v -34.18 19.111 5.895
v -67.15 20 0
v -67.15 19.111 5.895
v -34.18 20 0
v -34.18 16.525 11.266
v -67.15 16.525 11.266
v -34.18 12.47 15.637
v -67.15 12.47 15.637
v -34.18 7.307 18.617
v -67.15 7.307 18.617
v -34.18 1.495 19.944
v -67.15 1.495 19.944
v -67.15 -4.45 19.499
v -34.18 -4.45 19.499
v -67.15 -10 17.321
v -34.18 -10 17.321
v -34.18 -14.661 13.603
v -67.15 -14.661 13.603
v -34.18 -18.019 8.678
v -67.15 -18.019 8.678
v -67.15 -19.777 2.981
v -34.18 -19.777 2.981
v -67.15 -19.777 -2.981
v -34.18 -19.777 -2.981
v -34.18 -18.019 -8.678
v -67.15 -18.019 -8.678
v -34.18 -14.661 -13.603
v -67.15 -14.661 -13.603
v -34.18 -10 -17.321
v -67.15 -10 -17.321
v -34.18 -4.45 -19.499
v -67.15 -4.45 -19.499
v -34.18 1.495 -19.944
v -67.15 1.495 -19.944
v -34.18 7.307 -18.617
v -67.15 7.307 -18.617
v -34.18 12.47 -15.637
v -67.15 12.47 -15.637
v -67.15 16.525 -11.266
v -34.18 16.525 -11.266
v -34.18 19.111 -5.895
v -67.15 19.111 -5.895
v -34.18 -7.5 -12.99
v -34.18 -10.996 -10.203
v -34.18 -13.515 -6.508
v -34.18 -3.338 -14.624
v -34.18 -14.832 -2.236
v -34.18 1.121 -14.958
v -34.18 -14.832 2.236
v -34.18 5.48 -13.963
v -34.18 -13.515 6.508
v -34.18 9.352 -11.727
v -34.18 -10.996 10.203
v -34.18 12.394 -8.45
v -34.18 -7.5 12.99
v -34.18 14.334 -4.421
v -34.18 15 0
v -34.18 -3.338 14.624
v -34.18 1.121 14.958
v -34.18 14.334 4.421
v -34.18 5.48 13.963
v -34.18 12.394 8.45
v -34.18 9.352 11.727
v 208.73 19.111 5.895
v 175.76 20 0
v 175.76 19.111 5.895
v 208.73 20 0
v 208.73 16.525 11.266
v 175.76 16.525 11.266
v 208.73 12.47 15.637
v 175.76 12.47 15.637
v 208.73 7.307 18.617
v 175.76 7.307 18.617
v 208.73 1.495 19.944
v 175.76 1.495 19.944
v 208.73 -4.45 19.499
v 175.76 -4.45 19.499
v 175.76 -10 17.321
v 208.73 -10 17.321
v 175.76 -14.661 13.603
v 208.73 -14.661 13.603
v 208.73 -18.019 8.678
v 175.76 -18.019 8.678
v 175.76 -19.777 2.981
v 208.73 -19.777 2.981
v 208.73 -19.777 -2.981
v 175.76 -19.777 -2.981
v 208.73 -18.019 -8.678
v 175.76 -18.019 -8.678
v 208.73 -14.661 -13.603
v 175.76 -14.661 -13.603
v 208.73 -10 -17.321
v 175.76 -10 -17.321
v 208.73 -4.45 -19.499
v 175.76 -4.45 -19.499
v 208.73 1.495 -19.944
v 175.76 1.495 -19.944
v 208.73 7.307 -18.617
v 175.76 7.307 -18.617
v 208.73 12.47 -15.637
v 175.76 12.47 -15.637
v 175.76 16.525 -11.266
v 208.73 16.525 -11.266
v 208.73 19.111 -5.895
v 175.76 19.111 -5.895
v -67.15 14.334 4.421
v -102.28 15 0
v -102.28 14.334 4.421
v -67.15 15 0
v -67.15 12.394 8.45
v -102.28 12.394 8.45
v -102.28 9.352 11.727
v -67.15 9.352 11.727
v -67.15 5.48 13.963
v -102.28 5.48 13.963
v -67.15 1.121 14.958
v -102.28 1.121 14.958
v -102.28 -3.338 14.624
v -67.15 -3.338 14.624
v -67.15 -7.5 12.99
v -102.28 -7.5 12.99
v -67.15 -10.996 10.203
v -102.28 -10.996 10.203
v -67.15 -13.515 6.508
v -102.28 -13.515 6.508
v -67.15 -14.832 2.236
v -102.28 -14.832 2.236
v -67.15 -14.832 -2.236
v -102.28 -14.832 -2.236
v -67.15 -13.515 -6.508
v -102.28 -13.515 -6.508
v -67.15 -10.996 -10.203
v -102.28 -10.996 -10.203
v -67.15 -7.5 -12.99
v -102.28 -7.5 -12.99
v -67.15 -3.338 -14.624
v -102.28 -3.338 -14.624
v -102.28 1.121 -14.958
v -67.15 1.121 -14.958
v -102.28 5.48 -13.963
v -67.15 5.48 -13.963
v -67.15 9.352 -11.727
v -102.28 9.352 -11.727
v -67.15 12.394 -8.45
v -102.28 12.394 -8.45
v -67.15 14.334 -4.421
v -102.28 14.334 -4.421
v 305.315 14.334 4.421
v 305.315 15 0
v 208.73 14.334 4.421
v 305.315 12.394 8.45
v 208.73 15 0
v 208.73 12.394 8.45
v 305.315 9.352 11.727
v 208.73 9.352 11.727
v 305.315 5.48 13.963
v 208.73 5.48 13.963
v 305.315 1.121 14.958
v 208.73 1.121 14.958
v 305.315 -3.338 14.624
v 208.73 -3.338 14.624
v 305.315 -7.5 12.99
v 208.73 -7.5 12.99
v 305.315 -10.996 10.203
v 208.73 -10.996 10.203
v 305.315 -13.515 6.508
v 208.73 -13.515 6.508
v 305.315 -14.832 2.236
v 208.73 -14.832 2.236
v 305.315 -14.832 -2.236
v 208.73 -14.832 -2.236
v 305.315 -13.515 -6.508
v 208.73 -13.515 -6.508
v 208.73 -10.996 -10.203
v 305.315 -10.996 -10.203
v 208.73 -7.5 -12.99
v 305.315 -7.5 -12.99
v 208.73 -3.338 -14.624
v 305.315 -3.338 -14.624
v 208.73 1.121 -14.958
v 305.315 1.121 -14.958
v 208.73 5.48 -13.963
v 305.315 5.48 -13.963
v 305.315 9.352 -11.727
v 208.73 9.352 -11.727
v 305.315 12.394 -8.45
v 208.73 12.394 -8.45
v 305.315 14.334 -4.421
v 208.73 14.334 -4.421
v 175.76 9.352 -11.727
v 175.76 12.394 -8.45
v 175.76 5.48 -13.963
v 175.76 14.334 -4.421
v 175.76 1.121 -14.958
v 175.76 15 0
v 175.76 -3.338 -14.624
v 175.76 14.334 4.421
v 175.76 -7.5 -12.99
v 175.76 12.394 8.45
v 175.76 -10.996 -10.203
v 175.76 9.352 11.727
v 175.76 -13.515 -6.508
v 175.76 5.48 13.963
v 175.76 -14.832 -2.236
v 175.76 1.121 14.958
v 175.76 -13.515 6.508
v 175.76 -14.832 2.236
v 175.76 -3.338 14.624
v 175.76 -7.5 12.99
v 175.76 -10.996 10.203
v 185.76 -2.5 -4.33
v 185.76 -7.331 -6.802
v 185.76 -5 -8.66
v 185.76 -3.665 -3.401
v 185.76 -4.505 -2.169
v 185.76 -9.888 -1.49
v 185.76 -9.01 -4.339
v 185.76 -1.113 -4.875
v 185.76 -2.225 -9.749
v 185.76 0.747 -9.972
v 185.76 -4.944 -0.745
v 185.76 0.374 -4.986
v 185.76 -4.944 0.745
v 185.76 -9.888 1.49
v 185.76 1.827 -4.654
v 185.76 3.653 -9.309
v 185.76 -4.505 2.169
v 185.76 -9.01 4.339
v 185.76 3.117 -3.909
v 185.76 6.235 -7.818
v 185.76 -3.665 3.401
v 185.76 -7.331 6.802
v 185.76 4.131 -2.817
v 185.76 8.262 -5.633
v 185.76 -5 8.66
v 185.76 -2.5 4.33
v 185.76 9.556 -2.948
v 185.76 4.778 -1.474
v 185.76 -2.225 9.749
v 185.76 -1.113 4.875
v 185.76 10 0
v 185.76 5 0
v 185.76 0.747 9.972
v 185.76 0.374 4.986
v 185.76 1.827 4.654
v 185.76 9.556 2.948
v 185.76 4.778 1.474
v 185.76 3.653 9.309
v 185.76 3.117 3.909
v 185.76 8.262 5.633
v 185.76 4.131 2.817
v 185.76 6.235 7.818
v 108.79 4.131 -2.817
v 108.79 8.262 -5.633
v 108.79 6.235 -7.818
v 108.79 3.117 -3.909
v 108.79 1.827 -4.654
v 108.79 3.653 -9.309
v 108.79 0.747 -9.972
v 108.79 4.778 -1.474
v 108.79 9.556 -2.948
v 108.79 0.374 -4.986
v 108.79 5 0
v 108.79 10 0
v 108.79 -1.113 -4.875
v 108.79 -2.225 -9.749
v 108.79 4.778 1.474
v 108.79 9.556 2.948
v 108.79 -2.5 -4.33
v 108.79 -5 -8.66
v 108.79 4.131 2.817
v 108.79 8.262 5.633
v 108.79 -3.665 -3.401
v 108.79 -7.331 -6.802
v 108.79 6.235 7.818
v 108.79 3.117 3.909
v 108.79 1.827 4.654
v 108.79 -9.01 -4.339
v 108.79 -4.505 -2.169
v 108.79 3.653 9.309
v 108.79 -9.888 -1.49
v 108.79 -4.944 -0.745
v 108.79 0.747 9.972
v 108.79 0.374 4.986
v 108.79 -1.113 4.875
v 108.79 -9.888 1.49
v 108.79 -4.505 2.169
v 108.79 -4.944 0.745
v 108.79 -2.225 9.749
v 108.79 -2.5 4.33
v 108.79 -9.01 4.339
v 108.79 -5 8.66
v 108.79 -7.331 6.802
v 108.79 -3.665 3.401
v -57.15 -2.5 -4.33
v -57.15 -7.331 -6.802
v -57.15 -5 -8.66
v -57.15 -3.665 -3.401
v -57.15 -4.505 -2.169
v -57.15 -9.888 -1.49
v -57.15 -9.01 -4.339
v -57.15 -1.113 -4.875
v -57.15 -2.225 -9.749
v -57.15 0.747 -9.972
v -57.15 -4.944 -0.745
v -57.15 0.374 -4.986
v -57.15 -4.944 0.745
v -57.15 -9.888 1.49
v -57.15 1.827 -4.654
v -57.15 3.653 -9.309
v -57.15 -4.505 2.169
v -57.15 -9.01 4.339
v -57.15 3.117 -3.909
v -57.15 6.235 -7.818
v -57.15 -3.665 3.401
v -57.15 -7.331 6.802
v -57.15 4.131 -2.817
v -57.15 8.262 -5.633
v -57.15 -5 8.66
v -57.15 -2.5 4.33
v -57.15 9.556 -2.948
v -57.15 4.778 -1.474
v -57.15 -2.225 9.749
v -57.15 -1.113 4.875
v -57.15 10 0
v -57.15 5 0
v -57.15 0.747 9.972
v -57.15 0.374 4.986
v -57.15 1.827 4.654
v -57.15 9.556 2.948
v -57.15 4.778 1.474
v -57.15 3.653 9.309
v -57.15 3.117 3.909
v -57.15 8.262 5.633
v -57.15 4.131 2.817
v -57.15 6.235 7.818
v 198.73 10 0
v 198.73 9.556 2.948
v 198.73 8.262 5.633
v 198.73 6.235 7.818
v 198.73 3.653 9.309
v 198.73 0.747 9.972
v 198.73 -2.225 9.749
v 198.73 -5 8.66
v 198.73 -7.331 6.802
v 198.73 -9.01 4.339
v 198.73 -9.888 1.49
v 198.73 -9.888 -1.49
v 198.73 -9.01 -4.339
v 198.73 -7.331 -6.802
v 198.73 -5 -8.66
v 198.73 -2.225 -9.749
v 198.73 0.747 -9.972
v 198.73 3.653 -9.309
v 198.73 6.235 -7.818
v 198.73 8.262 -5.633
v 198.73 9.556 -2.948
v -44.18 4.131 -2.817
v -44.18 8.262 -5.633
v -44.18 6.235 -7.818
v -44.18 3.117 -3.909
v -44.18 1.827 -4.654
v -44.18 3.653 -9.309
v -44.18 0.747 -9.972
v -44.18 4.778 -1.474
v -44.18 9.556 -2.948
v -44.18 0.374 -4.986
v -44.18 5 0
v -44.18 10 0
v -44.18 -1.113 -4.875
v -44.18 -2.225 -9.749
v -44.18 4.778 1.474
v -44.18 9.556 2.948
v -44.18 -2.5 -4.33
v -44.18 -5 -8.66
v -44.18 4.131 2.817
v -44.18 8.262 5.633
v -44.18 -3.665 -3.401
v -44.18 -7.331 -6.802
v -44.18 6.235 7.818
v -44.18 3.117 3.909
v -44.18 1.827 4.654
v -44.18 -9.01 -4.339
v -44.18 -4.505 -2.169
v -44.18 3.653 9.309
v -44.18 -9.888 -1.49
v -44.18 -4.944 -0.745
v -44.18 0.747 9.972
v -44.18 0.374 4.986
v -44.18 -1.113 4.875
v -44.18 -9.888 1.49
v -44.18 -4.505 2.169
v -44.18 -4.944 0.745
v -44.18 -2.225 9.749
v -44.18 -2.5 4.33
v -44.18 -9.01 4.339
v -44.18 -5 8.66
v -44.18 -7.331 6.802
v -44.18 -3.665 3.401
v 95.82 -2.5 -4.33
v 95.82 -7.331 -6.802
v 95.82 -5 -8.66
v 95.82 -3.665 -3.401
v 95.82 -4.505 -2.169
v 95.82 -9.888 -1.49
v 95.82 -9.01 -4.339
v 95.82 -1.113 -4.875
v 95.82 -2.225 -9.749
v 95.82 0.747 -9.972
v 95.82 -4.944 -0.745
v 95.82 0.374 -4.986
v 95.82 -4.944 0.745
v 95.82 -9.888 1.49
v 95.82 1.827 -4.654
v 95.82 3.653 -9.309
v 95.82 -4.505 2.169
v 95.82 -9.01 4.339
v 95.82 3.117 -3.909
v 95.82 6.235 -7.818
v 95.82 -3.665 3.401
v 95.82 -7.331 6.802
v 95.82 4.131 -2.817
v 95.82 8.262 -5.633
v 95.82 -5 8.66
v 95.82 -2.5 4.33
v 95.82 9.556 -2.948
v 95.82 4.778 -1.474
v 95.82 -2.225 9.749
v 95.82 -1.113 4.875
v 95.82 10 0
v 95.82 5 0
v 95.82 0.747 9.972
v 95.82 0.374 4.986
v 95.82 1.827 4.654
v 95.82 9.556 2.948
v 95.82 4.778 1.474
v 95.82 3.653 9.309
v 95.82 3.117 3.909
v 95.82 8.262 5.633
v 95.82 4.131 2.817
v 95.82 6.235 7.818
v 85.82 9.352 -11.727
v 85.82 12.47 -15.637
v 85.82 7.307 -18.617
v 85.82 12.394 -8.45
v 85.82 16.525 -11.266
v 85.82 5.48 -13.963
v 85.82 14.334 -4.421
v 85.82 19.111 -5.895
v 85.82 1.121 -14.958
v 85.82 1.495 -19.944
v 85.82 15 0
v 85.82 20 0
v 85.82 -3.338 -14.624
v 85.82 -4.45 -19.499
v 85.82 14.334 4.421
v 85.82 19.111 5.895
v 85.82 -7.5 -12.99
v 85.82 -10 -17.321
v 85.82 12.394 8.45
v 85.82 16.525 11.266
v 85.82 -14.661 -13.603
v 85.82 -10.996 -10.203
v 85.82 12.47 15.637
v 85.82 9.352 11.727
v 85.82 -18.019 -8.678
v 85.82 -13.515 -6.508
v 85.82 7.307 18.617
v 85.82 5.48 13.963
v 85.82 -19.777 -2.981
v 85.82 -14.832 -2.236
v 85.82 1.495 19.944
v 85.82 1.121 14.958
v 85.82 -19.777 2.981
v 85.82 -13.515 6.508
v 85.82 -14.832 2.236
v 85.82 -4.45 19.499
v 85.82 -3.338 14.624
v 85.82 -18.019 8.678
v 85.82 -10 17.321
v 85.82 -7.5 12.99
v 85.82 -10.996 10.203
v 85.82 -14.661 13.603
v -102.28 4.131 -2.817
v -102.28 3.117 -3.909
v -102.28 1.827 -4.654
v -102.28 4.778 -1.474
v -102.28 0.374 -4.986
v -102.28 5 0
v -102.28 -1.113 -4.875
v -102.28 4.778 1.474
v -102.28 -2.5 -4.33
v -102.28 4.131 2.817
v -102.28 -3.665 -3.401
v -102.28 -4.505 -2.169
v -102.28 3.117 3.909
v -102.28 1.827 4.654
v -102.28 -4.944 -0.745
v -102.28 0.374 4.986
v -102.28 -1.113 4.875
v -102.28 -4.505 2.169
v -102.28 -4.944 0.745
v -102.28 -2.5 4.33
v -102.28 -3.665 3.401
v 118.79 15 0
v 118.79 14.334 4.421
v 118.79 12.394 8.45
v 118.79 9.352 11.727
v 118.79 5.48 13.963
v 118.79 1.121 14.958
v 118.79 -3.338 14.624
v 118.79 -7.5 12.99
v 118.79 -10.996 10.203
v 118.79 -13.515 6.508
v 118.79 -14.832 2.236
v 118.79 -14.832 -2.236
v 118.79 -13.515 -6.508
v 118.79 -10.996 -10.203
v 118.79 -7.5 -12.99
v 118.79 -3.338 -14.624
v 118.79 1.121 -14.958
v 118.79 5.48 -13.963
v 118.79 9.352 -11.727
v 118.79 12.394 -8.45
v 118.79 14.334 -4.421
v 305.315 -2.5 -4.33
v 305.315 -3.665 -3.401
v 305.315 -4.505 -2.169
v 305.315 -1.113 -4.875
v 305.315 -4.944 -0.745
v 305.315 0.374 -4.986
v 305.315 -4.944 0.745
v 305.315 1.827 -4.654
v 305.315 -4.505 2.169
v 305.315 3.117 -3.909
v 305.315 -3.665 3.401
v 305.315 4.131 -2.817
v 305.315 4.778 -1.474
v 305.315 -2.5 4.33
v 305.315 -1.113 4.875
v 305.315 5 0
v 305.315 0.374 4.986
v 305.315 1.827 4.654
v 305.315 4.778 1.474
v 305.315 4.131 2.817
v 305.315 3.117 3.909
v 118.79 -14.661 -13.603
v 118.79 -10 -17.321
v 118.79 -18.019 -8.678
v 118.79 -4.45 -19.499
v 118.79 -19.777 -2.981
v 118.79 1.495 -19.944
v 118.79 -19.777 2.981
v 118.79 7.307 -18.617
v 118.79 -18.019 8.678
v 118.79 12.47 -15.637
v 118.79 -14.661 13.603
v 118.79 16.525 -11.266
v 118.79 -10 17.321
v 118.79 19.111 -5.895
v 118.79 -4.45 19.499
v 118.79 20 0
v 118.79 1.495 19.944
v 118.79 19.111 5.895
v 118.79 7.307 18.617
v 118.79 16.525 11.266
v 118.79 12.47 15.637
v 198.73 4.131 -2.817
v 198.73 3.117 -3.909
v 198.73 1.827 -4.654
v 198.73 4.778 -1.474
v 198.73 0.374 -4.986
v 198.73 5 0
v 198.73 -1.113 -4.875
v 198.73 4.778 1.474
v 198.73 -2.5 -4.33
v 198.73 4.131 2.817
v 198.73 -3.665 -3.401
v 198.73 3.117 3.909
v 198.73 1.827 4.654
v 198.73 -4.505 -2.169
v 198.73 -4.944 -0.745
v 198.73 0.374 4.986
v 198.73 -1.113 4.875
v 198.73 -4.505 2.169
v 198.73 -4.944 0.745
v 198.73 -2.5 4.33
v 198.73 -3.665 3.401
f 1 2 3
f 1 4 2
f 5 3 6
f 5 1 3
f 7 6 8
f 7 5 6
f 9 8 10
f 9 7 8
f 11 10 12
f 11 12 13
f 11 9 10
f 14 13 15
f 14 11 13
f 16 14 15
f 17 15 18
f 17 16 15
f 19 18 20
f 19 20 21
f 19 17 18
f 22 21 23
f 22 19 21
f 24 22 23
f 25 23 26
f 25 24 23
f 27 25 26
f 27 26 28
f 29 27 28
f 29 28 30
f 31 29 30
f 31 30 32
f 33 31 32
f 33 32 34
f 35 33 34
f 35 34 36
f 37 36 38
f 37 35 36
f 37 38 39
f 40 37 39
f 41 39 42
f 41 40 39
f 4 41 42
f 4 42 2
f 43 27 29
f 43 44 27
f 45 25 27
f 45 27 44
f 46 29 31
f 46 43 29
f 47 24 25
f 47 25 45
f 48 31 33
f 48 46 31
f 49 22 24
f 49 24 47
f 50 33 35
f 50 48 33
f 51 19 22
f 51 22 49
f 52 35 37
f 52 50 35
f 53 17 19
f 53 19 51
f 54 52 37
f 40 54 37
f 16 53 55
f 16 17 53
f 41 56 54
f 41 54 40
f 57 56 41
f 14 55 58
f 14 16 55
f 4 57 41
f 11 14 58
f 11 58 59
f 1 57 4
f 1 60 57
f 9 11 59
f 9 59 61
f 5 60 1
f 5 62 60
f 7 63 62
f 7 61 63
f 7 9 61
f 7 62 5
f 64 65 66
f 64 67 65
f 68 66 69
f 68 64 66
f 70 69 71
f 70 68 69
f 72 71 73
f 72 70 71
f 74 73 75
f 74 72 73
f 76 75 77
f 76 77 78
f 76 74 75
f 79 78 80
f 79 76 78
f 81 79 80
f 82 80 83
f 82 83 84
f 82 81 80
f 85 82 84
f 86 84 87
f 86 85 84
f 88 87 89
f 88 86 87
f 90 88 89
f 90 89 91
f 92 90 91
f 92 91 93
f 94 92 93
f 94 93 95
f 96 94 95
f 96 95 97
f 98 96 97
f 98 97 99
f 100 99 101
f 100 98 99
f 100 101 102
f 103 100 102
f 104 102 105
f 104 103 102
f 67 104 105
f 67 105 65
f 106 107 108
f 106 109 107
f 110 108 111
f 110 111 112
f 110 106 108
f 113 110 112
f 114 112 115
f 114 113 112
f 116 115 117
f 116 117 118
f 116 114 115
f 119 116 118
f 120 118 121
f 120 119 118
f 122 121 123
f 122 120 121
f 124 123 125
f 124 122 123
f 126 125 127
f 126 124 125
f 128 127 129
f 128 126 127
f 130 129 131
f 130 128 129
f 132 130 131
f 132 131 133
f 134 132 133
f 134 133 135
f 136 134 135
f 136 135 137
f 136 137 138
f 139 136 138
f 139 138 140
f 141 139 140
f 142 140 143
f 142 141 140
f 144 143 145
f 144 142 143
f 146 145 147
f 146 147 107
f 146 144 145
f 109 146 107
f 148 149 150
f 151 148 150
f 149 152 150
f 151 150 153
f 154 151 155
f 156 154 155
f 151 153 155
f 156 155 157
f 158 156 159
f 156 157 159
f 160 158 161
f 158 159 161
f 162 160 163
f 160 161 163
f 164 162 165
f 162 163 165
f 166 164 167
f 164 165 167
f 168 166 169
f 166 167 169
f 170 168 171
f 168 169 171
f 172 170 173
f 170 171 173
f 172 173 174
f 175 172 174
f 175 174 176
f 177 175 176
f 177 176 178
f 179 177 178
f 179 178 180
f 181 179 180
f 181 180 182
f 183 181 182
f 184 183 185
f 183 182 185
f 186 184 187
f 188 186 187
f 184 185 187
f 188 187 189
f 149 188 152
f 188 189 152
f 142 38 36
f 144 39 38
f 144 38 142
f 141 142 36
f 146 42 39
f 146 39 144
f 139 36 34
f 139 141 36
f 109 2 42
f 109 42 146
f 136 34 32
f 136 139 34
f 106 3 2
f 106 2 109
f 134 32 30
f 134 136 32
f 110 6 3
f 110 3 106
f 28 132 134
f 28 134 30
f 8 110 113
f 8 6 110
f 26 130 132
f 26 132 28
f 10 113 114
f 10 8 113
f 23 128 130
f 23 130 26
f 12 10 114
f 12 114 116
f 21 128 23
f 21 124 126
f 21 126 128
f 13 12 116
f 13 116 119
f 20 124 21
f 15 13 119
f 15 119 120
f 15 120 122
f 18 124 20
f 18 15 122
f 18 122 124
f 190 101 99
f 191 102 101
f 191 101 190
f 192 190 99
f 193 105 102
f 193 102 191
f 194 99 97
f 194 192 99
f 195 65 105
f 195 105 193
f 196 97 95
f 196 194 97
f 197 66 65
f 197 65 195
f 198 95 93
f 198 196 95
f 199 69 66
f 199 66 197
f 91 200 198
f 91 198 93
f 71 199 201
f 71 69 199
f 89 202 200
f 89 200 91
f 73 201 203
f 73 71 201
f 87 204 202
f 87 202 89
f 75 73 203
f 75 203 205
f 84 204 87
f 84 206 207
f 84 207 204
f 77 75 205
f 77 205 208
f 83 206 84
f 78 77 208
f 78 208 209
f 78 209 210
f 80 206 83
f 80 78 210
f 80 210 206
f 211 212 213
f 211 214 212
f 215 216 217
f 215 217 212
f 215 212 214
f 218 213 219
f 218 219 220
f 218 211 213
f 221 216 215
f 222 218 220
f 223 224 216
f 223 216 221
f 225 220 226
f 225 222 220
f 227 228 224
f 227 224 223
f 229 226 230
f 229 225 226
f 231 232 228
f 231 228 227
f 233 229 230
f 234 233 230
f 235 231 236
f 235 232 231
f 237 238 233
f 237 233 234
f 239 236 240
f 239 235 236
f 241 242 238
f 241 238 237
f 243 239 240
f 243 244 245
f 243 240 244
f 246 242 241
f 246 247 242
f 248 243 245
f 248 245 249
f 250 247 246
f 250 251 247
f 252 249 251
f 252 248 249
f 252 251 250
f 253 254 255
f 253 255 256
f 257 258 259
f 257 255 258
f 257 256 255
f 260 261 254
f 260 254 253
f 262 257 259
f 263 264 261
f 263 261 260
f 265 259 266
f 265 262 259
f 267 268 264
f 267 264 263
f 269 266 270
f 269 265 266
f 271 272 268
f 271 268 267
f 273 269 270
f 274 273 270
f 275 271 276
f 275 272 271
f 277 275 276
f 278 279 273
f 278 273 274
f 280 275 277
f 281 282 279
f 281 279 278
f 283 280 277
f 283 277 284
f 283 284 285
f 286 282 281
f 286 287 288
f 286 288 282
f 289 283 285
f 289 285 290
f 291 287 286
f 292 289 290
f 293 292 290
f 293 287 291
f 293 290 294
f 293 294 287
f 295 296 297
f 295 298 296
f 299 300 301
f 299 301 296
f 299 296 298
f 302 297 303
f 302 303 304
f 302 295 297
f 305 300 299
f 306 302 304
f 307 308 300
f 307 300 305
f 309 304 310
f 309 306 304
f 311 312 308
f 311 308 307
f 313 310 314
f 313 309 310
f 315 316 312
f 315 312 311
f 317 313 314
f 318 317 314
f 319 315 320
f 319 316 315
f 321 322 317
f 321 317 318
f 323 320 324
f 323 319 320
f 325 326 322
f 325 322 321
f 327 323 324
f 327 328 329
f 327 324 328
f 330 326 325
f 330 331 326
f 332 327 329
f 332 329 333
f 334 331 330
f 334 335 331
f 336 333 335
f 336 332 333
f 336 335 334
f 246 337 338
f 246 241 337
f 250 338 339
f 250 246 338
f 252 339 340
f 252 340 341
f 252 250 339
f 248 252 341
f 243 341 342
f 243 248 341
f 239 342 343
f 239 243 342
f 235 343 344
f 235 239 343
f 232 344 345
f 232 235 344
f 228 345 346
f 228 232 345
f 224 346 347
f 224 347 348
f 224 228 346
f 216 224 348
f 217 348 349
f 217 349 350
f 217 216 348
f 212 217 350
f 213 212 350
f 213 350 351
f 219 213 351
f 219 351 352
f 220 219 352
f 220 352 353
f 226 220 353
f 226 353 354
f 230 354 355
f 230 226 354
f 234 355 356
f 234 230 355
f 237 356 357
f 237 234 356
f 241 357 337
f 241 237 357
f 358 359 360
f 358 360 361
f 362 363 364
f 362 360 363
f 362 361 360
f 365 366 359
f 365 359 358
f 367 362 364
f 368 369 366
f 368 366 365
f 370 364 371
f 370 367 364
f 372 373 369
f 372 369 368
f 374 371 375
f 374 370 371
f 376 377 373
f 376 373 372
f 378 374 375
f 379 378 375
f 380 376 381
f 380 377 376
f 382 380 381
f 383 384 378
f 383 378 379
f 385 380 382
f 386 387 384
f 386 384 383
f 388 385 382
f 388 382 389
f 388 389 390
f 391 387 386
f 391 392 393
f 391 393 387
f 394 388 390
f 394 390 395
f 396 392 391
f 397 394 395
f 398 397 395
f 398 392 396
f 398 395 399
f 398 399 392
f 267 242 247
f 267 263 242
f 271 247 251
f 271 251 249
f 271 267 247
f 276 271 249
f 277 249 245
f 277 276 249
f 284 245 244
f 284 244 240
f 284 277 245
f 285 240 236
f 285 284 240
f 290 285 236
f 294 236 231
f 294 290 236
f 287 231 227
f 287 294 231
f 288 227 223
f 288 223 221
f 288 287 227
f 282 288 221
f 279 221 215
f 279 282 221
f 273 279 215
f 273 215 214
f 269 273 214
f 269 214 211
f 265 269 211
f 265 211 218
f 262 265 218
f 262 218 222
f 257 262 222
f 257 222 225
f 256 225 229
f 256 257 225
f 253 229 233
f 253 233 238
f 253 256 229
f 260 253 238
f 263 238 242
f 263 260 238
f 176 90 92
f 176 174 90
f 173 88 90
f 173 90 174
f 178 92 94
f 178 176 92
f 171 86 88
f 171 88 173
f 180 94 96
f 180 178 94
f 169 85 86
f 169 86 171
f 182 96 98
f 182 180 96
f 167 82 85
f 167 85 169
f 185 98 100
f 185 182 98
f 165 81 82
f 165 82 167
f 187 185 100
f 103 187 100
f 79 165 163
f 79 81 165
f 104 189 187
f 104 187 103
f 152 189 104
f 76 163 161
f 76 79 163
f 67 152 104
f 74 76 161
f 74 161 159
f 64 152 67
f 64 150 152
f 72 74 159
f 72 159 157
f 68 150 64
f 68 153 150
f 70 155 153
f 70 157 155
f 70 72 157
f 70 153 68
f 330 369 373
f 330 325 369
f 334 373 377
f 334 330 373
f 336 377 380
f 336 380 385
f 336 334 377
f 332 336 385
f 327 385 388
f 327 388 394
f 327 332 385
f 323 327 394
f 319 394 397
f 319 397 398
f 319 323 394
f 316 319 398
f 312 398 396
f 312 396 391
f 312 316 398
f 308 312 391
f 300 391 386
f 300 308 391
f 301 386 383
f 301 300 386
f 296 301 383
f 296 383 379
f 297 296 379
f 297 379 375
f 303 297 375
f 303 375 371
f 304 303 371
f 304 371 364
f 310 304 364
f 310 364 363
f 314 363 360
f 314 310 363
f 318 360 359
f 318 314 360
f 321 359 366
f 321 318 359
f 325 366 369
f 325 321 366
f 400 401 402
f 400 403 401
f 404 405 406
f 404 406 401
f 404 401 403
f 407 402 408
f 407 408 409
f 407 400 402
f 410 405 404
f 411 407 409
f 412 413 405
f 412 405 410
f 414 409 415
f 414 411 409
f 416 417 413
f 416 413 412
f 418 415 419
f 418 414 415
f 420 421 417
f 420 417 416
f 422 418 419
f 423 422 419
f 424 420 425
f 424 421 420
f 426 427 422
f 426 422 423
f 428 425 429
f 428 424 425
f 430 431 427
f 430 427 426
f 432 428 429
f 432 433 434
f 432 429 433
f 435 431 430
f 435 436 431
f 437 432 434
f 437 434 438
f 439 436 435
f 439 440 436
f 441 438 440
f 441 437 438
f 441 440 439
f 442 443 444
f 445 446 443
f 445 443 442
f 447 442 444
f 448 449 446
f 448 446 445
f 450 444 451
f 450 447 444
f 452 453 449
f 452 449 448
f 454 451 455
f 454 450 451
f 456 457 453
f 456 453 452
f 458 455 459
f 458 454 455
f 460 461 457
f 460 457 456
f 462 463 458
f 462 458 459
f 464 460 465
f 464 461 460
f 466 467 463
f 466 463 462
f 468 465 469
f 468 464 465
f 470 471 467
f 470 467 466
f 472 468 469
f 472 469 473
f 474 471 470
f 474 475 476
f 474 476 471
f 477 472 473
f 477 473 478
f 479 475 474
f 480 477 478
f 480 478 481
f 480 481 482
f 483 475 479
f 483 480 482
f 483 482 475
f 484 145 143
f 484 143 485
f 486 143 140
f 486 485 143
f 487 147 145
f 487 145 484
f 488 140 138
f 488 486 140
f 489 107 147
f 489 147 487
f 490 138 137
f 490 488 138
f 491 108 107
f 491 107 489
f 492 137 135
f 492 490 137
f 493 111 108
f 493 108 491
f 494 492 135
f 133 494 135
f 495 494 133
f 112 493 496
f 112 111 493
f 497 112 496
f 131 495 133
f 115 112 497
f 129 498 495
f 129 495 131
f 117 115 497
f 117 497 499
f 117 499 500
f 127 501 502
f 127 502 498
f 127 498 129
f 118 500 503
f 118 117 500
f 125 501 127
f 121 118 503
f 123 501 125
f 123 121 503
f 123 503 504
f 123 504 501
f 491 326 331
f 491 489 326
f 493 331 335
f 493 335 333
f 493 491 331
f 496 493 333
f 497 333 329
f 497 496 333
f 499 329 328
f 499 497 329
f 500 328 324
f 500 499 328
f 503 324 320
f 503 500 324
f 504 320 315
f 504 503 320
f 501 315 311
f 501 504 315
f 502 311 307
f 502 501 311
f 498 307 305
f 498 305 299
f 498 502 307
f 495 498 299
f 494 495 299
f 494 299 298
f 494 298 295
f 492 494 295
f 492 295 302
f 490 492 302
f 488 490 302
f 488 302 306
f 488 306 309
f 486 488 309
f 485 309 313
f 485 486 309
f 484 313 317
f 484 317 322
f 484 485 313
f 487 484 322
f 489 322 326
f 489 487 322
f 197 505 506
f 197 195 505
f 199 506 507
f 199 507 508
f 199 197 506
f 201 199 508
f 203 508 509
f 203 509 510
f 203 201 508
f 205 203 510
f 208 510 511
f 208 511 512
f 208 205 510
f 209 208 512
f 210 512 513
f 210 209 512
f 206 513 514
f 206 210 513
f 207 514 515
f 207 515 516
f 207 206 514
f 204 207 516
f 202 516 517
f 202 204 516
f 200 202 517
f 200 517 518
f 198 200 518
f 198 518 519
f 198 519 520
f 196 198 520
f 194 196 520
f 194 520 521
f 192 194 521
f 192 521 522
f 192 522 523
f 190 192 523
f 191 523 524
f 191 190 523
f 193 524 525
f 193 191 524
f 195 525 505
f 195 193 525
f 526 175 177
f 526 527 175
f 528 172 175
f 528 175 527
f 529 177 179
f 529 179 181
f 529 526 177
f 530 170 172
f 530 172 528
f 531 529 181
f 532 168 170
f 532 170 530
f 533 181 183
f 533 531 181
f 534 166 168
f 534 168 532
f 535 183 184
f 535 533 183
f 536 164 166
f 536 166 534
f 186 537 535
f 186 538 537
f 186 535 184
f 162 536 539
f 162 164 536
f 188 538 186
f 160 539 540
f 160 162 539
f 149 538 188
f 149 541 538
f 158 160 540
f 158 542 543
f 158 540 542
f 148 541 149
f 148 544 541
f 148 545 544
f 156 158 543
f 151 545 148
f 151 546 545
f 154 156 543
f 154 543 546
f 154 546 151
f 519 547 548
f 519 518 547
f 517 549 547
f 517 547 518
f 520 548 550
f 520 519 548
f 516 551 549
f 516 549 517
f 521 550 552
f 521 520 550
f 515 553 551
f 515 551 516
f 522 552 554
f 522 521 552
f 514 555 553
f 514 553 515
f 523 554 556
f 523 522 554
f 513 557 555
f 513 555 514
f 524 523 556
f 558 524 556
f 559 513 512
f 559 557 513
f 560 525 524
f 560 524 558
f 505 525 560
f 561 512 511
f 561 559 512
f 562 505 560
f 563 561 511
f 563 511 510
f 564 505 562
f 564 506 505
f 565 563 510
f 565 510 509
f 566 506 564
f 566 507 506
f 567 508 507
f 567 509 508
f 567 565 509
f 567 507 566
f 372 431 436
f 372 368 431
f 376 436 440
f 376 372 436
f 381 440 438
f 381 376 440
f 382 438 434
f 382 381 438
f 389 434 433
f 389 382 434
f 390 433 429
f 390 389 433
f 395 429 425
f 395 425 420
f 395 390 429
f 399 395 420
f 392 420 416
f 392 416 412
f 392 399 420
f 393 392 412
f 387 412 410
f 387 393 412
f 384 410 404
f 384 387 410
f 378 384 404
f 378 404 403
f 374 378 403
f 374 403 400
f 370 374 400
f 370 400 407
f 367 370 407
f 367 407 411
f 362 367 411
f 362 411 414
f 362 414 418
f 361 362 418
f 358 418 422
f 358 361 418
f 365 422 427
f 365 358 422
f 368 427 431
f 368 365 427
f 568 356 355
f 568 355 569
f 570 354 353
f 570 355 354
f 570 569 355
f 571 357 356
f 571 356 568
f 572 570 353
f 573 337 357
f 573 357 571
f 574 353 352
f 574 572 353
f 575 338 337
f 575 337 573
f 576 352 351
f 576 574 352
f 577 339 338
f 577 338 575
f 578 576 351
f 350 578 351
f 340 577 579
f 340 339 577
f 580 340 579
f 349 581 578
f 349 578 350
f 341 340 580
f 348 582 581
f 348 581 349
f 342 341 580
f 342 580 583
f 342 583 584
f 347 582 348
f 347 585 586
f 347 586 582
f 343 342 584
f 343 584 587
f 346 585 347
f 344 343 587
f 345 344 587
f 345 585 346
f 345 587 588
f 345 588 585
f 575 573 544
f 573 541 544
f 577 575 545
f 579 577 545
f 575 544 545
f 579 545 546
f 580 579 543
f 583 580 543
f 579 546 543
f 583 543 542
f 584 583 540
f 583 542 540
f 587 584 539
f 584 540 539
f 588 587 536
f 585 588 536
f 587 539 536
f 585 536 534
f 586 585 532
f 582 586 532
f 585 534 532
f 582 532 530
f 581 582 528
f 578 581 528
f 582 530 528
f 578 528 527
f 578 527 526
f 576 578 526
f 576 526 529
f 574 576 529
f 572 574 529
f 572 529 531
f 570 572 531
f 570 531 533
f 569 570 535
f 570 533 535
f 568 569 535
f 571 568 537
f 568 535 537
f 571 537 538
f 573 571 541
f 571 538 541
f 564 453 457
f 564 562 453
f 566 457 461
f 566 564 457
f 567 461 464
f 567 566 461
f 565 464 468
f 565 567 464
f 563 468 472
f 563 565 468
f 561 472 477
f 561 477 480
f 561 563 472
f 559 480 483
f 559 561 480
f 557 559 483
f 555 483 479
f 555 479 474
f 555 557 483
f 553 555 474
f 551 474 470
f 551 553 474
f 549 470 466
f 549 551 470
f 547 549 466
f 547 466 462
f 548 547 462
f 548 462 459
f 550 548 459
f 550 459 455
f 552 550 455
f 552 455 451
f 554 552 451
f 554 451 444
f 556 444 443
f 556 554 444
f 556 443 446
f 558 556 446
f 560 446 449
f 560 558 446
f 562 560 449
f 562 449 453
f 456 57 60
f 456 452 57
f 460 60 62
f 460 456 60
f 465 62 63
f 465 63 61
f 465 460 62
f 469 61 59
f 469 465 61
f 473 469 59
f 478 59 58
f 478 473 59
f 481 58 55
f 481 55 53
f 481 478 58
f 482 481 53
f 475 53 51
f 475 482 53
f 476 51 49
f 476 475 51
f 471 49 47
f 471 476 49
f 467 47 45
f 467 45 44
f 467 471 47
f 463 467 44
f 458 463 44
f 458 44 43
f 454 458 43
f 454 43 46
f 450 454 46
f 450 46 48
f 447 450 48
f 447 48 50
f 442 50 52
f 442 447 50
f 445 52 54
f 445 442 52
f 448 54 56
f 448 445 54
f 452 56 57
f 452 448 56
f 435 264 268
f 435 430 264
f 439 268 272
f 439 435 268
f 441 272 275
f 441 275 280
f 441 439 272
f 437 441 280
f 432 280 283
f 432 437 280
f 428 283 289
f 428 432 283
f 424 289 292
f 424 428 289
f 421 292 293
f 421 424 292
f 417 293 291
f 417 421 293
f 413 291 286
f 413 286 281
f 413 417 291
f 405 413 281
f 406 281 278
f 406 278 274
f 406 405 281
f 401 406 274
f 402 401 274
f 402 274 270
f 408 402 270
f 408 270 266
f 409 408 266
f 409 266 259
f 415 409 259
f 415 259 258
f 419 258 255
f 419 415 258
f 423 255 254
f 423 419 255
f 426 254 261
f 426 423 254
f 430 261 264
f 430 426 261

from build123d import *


with BuildPart() as part:
    # Sketch1 → Revolve-Thin1 (revolve)
    with BuildSketch(Plane.XY):
        Polygon((-102.279792746, 15), (-67.150259067, 15), (-67.150259067, 20), (-34.180259067, 20), (-34.180259067, 15), (85.819740933, 15), (85.819740933, 20), (118.789740933, 20), (118.789740933, 15), (175.759740933, 15), (175.759740933, 20), (208.729740933, 20), (208.729740933, 15), (218.211606218, 15), (305.314834779, 15), (305.314834779, 5), (218.211606218, 5), (198.729740933, 5), (198.729740933, 10), (185.759740933, 10), (185.759740933, 5), (108.789740933, 5), (108.789740933, 10), (95.819740933, 10), (95.819740933, 5), (-44.180259067, 5), (-44.180259067, 10), (-57.150259067, 10), (-57.150259067, 5), (-102.279792746, 5), align=None)
    revolve(axis=Axis((-102.279792746, 0, 0), (1, 0, 0)))


solid = part.part
